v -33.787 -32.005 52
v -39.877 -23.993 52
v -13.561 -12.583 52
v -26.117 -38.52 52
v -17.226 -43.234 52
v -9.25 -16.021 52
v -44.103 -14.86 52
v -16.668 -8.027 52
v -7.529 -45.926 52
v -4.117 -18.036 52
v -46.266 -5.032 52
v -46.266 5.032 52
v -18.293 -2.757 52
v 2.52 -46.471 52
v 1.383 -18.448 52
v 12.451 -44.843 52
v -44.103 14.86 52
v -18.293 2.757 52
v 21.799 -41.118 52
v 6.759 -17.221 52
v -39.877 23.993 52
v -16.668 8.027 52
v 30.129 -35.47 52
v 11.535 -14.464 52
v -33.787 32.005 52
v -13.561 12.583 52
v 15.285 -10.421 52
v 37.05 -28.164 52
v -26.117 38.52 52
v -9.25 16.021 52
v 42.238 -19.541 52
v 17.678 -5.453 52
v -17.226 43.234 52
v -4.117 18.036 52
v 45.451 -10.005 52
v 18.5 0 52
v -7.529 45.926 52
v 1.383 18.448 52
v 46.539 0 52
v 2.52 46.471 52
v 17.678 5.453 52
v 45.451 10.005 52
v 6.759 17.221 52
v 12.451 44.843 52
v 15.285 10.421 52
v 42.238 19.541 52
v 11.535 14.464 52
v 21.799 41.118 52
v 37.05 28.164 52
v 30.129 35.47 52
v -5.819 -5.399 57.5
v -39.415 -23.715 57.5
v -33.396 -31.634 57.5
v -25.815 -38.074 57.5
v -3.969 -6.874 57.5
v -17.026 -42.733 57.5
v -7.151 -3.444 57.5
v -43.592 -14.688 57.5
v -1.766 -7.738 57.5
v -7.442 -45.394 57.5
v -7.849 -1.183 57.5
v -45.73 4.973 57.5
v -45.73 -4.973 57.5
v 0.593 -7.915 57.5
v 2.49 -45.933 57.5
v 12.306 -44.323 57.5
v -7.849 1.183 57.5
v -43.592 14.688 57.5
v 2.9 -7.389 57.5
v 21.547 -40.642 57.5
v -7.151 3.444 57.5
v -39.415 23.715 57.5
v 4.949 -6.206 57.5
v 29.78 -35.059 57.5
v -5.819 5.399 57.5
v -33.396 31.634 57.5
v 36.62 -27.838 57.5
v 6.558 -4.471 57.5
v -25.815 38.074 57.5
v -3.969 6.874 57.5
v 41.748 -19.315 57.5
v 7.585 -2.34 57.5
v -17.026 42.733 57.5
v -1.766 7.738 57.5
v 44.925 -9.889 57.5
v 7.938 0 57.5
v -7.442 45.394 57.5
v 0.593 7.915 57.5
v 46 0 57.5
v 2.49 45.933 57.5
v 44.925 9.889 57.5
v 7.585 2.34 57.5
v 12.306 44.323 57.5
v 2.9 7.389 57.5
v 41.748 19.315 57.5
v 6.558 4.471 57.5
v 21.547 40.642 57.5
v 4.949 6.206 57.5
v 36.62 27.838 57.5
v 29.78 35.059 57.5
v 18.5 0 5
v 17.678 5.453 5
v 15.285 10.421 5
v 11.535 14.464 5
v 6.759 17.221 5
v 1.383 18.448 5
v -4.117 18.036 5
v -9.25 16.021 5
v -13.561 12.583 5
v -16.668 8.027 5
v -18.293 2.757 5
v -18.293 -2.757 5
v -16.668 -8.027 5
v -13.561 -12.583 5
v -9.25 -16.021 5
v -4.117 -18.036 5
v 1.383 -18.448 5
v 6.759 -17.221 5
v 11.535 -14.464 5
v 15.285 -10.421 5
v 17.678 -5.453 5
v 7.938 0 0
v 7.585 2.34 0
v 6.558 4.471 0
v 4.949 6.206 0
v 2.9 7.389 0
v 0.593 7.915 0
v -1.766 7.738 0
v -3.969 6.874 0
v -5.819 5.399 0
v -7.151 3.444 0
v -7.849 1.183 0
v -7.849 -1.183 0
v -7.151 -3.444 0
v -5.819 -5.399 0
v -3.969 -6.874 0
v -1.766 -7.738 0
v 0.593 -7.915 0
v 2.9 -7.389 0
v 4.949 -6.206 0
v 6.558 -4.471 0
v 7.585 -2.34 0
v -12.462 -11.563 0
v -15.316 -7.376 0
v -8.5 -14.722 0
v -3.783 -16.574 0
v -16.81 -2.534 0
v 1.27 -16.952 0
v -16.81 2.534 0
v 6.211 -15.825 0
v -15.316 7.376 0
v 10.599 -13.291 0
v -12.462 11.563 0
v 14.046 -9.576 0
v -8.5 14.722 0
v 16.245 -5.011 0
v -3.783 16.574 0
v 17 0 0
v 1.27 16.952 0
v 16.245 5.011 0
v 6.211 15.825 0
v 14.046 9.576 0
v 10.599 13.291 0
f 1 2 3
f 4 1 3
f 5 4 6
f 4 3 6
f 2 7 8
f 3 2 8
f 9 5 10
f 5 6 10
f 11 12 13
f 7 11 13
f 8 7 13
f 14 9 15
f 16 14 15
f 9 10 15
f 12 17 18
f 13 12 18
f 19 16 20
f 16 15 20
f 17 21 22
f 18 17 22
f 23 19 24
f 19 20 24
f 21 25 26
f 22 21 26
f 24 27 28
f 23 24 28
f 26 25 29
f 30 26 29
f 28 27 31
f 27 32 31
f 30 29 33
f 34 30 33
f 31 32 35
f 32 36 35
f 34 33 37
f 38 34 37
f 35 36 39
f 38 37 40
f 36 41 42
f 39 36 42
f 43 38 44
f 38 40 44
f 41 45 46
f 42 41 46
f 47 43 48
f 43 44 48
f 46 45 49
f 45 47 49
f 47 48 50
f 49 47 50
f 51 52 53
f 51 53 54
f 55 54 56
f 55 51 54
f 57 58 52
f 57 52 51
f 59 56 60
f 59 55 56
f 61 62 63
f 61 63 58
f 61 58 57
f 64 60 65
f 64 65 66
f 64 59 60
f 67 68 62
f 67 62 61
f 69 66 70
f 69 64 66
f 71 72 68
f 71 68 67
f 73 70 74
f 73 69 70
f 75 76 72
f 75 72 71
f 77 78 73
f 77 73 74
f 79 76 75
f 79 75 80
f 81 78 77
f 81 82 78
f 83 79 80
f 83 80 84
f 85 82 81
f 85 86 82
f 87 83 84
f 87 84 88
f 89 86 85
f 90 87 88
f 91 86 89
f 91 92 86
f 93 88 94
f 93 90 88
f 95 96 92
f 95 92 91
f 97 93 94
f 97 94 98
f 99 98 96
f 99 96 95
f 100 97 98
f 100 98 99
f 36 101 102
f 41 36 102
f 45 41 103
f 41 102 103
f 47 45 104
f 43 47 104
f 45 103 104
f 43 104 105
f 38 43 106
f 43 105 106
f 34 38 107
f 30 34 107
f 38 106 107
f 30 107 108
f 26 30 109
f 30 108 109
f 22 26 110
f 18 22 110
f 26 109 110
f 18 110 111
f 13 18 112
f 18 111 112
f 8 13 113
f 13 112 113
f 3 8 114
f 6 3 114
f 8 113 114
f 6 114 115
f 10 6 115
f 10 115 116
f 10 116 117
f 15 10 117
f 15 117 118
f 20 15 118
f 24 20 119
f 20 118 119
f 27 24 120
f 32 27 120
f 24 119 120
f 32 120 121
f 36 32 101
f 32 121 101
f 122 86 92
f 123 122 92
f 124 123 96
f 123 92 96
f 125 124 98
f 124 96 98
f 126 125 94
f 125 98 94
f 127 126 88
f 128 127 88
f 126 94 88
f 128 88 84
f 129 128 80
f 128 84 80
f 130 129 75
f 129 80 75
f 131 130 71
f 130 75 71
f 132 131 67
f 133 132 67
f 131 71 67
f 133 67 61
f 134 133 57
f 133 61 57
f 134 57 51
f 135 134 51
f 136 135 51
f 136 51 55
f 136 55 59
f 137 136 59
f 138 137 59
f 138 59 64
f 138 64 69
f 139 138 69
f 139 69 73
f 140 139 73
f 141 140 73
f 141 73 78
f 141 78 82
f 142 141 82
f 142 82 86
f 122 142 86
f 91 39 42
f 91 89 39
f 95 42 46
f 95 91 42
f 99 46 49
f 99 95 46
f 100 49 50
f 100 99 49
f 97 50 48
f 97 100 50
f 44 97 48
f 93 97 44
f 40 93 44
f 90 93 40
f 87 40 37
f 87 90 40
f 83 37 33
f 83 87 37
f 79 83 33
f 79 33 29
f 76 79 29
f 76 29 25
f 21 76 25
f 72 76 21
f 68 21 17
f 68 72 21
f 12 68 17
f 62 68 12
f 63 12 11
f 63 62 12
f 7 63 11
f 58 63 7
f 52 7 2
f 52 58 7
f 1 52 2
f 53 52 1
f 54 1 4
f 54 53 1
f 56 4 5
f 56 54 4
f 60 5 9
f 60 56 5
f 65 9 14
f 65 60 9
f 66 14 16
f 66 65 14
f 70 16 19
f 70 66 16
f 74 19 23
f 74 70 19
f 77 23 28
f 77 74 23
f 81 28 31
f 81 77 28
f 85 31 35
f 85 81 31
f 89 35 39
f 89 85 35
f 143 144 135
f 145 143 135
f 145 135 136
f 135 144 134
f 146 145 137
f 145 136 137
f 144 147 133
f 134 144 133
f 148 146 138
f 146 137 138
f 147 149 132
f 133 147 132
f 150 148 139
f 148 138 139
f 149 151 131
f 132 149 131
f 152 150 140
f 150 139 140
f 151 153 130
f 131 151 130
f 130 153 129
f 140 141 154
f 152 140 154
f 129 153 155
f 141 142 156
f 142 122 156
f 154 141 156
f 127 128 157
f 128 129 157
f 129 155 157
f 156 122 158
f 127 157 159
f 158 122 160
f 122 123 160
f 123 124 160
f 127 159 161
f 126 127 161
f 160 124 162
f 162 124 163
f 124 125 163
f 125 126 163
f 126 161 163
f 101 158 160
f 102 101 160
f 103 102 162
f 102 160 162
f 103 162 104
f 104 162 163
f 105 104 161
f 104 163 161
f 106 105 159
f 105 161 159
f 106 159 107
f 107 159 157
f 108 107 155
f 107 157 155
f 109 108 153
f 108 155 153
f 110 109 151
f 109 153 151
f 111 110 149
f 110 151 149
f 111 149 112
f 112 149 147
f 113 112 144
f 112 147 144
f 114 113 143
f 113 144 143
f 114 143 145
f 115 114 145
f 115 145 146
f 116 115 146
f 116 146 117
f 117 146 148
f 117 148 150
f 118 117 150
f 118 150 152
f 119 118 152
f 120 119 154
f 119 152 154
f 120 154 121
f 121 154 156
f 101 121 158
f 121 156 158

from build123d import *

# Parameters (mm, degrees)
F0_R     = 18.5
F1_DEPTH = 52
F2_SIZE2 = 1.5
F2_SIZE  = 5
F3_R     = 47
F4_DEPTH = 5.5
F6_R     = 7.9375
F7_DEPTH = 57.501


# Not quite as in the source:
# - a fillet or chamfer that OpenCascade refuses, or shapes differently, is made with other operations: its cross-section is extruded or revolved along the edge and cut away or added


with BuildPart() as f1:
    # F0 (on Top) → F1 (new body)
    with BuildSketch(Plane.XY):
        Circle(F0_R)
    extrude(amount=F1_DEPTH)

    # F2
    f2_edges = [f1.edges().sort_by_distance(p)[0] for p in [
        (-18.5, 0, 0),
    ]]
    f2_side = f1.faces().sort_by_distance((-18.5, 0, 26))[0]
    chamfer(f2_edges, length=F2_SIZE, length2=F2_SIZE2, reference=f2_side)

    # F3 (on face) → F4 (join)
    with BuildSketch(Plane.XY.offset(52)):
        Circle(F3_R)
    extrude(amount=F4_DEPTH)

    # F5: chamfer of 1 x 10.2 on 1 edges, made by hand

    # F5_s1 → F5_t2 (revolve, cut)
    with BuildSketch(Plane.XZ):
        Polygon((47, 47.3), (46, 57.5), (47, 57.5), align=None)
    revolve(axis=Axis((0, 0, 57.5), (0, 0, 1)), mode=Mode.SUBTRACT)

    # F6 (on face) → F7 (cut, through all)
    with BuildSketch(Plane.XY.offset(57.5)):
        Circle(F6_R)
    extrude(amount=-F7_DEPTH, mode=Mode.SUBTRACT)


solid = f1.part
